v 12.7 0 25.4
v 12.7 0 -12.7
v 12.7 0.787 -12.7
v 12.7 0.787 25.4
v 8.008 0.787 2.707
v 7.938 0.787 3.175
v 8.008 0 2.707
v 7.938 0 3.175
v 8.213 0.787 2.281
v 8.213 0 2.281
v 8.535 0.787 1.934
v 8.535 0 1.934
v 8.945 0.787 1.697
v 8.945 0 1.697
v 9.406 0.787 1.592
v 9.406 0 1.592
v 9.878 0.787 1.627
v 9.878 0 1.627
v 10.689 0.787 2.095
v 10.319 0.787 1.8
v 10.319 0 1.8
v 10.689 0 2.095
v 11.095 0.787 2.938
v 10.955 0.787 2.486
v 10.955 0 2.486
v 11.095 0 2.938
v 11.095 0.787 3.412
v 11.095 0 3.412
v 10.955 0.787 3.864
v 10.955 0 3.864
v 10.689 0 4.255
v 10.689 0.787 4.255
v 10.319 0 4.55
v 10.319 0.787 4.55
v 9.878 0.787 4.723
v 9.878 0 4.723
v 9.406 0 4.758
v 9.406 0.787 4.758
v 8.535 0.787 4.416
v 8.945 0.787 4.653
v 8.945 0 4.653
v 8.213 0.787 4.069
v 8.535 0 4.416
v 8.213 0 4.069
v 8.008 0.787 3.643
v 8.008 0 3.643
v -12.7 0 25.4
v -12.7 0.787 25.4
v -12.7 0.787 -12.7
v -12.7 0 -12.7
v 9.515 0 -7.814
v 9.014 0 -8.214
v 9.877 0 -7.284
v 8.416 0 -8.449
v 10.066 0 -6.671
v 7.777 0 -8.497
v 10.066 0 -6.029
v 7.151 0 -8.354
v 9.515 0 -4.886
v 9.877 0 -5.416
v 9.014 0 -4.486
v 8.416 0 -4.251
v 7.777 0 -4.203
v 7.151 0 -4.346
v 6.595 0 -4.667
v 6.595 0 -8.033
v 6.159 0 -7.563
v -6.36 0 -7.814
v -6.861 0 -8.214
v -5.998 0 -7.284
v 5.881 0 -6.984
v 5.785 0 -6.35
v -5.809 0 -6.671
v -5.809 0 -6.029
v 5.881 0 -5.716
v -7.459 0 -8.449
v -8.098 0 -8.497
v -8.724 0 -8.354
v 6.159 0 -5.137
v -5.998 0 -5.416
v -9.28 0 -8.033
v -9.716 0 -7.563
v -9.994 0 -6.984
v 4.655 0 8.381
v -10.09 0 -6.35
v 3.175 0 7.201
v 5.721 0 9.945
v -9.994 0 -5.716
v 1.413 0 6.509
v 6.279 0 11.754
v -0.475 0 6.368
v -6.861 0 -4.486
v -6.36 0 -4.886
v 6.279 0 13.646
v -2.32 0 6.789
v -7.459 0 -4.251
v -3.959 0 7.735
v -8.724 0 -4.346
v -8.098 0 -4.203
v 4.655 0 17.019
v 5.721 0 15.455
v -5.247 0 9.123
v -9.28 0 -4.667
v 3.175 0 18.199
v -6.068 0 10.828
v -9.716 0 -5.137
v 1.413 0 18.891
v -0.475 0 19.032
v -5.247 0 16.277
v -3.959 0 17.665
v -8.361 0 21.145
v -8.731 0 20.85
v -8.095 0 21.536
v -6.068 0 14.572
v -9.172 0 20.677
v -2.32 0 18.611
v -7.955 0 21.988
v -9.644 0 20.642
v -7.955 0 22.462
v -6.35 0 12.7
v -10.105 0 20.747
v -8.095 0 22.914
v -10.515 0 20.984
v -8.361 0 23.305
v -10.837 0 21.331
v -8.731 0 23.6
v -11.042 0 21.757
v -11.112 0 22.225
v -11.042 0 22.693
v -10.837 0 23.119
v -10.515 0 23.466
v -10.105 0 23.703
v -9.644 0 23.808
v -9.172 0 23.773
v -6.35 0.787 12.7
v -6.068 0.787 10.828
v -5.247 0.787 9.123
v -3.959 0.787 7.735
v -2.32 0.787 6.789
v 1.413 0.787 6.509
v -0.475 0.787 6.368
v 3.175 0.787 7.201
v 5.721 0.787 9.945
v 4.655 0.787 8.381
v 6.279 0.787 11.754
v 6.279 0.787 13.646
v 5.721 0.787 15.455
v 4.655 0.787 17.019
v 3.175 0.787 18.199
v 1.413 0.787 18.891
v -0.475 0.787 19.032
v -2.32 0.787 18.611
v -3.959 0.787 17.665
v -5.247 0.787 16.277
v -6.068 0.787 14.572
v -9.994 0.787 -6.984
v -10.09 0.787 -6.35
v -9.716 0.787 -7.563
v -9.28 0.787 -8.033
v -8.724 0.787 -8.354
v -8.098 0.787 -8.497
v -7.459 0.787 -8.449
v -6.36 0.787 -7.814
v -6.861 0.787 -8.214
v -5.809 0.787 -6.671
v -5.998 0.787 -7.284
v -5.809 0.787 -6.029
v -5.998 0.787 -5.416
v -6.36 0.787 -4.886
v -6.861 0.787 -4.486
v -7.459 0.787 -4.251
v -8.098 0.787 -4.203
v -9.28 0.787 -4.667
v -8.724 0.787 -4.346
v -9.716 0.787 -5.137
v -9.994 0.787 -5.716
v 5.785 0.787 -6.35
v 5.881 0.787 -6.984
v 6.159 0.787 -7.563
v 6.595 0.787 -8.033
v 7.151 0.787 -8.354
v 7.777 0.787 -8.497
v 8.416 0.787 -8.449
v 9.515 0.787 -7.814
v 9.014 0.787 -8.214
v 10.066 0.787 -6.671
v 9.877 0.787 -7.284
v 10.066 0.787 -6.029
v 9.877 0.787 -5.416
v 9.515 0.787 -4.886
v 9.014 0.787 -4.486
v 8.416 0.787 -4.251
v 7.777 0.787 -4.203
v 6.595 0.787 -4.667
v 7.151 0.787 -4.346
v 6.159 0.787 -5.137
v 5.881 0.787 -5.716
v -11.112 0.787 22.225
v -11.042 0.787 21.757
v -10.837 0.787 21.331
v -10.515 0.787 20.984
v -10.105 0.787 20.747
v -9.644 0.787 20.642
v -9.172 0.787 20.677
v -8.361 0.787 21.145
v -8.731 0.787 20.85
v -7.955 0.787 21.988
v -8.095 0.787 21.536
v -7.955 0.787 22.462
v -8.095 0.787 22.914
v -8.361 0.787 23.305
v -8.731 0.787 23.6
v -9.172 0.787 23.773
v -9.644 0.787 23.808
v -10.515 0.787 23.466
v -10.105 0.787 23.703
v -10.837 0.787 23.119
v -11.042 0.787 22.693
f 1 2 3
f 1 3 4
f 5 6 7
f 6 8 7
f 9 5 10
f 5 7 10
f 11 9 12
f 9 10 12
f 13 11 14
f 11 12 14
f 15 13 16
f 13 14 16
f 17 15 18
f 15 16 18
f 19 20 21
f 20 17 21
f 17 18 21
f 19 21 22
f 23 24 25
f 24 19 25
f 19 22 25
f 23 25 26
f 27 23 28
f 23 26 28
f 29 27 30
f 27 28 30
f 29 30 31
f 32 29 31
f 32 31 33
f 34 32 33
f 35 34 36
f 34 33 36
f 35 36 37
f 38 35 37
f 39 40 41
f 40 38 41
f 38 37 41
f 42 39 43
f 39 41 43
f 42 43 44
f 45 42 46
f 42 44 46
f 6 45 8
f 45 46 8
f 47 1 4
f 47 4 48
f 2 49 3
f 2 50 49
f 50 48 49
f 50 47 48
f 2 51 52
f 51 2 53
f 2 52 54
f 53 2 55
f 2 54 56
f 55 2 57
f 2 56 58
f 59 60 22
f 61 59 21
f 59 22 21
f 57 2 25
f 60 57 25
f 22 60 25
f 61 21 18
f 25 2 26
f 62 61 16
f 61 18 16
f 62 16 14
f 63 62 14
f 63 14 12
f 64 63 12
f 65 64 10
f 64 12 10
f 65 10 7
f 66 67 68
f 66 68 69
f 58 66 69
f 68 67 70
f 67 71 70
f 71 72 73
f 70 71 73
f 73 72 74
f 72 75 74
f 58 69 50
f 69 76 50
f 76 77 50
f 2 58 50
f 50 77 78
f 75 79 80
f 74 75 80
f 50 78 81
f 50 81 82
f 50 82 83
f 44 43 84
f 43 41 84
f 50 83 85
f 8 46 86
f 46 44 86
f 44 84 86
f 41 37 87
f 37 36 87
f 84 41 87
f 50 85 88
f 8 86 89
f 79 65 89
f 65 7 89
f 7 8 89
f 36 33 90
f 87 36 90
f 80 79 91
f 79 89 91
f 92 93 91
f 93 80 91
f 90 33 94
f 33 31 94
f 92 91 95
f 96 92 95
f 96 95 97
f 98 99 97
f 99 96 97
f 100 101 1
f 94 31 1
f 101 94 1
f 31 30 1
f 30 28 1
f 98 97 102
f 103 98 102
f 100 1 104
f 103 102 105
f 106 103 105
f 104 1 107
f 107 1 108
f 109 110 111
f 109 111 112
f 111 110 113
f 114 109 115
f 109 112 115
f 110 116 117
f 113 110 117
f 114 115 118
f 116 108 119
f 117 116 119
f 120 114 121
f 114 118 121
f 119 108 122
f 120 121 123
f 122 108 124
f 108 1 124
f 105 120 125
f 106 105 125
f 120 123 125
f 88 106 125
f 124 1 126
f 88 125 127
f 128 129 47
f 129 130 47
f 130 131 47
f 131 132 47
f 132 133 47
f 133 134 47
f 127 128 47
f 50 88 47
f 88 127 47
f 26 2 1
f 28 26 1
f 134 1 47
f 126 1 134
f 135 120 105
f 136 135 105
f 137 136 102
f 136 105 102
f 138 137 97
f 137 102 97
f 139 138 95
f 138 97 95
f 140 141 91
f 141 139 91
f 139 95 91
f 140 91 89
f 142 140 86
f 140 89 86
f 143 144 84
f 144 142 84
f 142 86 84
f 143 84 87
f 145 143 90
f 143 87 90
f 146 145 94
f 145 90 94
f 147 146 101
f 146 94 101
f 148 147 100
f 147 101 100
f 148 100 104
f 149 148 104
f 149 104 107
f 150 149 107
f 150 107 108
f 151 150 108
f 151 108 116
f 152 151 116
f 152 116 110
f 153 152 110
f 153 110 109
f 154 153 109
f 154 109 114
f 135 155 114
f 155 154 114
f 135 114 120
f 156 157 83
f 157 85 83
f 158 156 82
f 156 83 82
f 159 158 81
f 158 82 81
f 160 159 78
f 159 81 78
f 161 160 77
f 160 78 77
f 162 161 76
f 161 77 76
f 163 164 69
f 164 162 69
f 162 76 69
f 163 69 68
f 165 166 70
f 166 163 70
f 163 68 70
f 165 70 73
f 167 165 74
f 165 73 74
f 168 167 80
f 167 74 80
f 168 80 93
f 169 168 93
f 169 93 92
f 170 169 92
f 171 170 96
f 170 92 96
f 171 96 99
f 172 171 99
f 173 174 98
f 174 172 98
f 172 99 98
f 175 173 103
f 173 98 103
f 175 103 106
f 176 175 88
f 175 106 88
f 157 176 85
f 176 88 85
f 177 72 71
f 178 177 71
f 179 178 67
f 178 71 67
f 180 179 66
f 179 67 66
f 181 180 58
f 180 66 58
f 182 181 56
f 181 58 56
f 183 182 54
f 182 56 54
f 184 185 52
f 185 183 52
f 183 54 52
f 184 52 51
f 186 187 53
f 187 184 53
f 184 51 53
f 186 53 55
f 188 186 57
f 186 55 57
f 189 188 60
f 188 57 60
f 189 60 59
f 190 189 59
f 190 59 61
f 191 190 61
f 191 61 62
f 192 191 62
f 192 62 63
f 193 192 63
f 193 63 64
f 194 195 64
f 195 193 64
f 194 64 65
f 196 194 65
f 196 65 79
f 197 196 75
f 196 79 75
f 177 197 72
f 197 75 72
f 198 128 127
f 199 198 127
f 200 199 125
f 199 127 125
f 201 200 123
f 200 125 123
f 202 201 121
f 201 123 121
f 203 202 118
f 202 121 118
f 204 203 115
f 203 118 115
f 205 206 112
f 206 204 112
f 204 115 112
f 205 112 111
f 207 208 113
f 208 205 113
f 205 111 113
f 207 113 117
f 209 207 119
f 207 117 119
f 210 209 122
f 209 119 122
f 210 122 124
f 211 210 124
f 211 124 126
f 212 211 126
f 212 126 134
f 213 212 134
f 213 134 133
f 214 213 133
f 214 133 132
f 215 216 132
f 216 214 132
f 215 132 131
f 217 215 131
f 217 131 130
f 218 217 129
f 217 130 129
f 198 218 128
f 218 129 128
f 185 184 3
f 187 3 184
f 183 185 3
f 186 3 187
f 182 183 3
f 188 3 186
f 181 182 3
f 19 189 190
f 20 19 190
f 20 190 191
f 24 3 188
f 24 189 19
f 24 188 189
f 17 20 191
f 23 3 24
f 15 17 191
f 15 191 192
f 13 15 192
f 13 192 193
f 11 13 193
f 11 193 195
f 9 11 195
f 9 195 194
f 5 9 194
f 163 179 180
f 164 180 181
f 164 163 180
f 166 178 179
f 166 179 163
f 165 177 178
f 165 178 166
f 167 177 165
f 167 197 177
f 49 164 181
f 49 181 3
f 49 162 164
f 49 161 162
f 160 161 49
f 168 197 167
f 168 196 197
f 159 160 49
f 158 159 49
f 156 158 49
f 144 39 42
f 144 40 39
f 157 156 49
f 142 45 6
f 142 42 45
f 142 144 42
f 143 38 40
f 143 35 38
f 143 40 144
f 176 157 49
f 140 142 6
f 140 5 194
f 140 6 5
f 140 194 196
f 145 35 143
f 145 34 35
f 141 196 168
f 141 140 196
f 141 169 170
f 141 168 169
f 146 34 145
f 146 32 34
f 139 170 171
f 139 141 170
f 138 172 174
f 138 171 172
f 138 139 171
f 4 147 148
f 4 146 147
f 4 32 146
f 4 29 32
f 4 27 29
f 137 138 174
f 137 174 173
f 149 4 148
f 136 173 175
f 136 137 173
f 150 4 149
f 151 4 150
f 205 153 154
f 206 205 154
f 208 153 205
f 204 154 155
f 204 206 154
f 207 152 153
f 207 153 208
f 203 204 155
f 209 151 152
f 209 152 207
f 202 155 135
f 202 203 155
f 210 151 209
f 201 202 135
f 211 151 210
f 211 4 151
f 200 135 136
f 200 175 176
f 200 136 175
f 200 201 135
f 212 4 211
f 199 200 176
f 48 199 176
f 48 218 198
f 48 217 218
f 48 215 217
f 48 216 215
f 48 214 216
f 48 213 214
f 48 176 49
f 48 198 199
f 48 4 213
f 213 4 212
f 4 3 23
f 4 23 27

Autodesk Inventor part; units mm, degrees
ref_plane "YZ Plane" through (0, 0, 0) normal (1, 0, 0) x (0, 1, 0)
ref_plane "XZ Plane" through (0, 0, 0) normal (0, 1, 0) x (-1, 0, 0)
ref_plane "XY Plane" through (0, 0, 0) normal (0, 0, 1) x (1, 0, 0)
sketch "Sketch1" plane through (0, 0, 0) normal (0, 1, 0) x (-1, 0, 0)
  line L0 (-12.7, 25.4) -> (12.7, 25.4)
  line L1 (12.7, 25.4) -> (12.7, -12.7)
  line L2 (12.7, -12.7) -> (-12.7, -12.7)
  line L3 (-12.7, -12.7) -> (-12.7, 25.4)
  line L4 (-12.7, 0) -> (12.7, 0) construction
  circle A0 centre (0, 12.7) radius 6.35
  circle A1 centre (9.525, 22.225) radius 1.5875
  circle A2 centre (-9.525, 3.175) radius 1.5875
  circle A3 centre (-7.9375, -6.35) radius 2.1526
  circle A4 centre (7.9375, -6.35) radius 2.1526
  point P0 (0, 0)
  point P1 (0, 0)
  dimension "d0" = 12.7
  dimension "d2" = 25.4
  dimension "d3" = 25.4
  dimension "d4" = 12.7
  dimension "d5" = 3.175
  dimension "d6" = 3.175
  dimension "d7" = 4.3053
  dimension "d8" = 4.3053
  dimension "d9" = 3.175
  dimension "d10" = 3.175
  dimension "d11" = 3.175
  dimension "d12" = 3.175
  dimension "d13" = 12.7
  dimension "d14" = 12.7
  dimension "d15" = 6.35
  dimension "d16" = 6.35
  dimension "d17" = 15.875
  dimension "d18" = 4.7625
extrude "Extrusion1" add sketch "Sketch1" along normal blind 0.7874
equation "\"d15\" = 0.5 * d0"
equation "\"d16\" = d15"
equation "\"d18\" = -0.5 * d17 + 0.5 * d2"
properties part number "launcher_hinge"
